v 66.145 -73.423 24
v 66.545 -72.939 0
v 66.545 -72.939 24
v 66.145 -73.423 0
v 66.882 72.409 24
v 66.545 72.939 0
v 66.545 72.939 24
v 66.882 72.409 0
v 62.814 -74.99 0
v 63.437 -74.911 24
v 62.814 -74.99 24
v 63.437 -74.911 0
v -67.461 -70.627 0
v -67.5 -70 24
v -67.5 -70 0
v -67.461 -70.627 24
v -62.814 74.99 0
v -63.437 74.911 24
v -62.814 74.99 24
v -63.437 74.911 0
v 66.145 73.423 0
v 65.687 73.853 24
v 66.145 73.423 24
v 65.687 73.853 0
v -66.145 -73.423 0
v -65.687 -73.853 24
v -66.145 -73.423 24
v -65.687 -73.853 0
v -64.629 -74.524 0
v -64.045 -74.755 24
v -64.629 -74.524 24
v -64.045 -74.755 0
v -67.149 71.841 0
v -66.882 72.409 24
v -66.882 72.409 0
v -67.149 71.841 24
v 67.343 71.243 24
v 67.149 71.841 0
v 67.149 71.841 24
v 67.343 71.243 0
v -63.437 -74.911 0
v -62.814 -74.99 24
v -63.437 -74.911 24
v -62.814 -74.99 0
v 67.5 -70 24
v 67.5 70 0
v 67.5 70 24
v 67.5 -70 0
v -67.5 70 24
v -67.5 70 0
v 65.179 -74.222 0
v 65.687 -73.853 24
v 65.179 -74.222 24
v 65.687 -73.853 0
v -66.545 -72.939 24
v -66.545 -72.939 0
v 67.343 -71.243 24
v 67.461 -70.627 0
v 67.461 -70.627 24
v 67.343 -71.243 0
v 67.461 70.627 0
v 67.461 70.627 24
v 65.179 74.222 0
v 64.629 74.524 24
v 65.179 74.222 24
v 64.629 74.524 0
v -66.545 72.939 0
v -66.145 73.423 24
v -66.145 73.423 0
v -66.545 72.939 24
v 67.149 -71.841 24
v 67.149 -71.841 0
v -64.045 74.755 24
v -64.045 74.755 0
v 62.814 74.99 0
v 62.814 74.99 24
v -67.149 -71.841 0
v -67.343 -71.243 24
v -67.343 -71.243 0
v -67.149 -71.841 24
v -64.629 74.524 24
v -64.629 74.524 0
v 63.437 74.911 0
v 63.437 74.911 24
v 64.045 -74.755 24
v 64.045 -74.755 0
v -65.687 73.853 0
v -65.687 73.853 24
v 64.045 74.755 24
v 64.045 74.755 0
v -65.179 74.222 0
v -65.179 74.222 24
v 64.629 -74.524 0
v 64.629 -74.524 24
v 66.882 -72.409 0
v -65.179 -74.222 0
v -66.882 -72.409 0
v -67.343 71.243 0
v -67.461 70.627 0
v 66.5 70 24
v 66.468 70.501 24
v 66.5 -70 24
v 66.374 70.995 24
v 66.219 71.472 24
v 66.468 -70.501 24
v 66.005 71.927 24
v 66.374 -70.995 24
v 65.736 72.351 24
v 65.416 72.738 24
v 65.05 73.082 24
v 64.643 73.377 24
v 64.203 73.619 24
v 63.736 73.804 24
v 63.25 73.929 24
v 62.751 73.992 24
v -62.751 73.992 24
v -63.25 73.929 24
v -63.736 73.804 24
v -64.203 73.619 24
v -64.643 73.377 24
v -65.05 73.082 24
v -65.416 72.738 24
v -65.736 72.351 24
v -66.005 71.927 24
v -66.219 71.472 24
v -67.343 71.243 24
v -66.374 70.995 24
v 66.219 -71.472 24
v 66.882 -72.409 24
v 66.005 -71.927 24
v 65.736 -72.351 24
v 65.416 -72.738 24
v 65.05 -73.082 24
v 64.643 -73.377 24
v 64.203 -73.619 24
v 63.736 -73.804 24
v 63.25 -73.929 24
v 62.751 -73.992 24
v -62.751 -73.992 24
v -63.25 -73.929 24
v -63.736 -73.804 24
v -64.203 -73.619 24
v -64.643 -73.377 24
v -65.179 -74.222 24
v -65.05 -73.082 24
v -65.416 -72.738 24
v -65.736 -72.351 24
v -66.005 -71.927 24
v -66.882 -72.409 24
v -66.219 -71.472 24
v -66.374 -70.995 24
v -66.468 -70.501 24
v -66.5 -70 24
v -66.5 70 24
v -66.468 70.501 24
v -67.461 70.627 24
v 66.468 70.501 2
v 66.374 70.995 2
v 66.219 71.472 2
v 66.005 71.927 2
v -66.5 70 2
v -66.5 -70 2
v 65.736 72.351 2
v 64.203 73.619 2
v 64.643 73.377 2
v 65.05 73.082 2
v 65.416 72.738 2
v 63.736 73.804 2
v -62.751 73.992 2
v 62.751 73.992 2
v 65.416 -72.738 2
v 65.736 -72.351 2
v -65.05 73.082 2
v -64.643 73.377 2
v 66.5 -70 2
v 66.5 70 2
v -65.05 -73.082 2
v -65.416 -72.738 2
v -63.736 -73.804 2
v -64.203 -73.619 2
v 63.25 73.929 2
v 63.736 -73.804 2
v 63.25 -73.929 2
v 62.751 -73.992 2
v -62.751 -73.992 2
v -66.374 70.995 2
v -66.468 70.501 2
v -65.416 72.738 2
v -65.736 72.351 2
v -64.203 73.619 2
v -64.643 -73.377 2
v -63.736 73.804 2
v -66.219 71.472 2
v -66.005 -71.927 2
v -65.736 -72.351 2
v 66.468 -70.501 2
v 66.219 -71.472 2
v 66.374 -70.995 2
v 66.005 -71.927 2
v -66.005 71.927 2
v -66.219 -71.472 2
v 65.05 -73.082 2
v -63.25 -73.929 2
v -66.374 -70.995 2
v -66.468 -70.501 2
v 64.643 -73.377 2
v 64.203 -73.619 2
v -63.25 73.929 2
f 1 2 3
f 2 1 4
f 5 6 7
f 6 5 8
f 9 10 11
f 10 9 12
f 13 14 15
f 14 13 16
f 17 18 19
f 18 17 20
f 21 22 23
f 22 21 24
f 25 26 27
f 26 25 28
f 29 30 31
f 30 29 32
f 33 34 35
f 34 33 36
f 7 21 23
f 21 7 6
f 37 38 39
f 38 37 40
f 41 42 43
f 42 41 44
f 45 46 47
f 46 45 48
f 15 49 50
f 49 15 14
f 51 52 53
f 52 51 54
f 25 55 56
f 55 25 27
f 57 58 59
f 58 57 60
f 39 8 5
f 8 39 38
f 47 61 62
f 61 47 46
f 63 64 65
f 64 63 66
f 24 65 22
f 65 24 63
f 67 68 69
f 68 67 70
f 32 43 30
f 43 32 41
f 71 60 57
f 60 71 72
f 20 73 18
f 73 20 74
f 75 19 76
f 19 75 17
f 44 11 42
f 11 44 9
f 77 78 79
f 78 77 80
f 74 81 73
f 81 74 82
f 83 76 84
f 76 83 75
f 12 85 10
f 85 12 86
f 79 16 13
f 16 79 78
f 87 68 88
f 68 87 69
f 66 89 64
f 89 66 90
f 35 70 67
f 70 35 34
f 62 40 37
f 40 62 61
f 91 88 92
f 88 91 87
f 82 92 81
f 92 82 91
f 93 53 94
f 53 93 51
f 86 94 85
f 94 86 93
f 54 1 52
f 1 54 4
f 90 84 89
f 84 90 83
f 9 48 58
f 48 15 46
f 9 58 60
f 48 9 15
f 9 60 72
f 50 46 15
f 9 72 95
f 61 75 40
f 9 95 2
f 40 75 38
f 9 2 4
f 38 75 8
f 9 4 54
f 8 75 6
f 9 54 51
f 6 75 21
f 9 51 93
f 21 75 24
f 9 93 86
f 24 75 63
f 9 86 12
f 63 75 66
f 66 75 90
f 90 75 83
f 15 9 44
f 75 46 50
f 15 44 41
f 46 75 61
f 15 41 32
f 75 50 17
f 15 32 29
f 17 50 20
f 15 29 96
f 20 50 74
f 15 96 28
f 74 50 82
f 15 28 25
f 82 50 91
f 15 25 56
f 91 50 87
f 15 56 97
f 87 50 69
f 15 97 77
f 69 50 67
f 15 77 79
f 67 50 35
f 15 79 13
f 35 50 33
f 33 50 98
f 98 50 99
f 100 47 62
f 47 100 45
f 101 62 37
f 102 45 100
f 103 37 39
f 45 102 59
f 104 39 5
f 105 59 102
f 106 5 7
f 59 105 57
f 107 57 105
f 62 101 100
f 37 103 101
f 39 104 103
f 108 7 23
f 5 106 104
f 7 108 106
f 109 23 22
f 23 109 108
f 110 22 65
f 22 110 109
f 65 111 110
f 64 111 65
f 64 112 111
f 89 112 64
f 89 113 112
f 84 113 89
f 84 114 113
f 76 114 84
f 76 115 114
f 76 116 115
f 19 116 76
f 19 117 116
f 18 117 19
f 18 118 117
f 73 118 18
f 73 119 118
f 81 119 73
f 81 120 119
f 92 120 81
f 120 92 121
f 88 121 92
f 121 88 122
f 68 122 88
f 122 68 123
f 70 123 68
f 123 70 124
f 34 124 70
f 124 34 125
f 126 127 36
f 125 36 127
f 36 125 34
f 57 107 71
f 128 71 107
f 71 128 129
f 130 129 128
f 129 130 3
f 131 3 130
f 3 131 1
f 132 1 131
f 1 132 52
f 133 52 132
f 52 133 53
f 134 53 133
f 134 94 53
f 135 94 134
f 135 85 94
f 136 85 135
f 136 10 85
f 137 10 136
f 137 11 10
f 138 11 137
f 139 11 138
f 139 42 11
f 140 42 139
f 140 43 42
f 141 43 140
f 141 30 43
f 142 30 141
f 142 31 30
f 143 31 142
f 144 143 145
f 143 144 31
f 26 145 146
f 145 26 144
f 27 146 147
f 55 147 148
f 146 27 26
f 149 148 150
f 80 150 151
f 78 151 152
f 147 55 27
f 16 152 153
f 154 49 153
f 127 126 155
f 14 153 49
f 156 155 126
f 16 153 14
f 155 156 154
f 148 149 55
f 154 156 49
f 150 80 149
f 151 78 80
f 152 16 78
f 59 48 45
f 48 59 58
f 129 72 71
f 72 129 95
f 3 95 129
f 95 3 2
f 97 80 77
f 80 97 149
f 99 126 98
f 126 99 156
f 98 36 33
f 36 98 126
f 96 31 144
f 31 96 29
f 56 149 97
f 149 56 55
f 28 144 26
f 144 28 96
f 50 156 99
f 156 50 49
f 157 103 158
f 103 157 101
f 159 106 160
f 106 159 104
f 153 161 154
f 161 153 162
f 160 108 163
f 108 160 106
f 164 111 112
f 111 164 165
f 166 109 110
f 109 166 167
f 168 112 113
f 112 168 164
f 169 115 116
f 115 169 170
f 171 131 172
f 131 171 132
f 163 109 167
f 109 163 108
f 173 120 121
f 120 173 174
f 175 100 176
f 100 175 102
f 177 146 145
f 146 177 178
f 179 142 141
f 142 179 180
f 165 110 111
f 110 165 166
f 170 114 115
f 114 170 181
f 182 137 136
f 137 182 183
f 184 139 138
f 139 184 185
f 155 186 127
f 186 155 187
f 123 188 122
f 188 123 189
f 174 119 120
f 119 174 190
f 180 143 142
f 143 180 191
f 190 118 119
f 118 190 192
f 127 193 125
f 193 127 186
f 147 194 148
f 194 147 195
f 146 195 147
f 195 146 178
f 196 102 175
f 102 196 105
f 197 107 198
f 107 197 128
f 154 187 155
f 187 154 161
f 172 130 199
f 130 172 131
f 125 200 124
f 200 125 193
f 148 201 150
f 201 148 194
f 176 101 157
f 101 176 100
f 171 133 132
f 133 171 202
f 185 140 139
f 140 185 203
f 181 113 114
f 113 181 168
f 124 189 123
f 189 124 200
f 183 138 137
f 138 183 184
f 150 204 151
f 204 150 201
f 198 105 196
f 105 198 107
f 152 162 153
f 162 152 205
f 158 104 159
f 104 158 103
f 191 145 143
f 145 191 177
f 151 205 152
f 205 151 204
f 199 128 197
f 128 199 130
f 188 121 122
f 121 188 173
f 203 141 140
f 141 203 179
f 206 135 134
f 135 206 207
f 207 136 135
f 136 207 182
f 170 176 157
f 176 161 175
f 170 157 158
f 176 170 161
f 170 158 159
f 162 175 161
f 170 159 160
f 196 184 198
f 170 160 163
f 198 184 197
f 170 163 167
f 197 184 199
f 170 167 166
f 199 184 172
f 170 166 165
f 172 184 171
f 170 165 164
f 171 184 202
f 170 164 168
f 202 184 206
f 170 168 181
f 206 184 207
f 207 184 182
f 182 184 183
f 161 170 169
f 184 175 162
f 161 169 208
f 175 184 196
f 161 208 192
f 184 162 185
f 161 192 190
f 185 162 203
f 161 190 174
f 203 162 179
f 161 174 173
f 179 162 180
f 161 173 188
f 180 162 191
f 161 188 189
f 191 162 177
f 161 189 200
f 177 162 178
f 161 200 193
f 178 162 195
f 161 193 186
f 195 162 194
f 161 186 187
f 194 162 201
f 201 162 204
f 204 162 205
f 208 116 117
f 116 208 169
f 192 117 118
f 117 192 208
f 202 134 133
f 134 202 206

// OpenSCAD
$fn = 50;


difference() {
	union() {
		hull() {
			translate(v = [-62.5000000000, 70.0000000000, 0]) {
				cylinder(h = 24, r = 5);
			}
			translate(v = [62.5000000000, 70.0000000000, 0]) {
				cylinder(h = 24, r = 5);
			}
			translate(v = [-62.5000000000, -70.0000000000, 0]) {
				cylinder(h = 24, r = 5);
			}
			translate(v = [62.5000000000, -70.0000000000, 0]) {
				cylinder(h = 24, r = 5);
			}
		}
	}
	union() {
		translate(v = [0, 0, 2]) {
			hull() {
				translate(v = [-62.5000000000, 70.0000000000, 0]) {
					cylinder(h = 22, r = 4);
				}
				translate(v = [62.5000000000, 70.0000000000, 0]) {
					cylinder(h = 22, r = 4);
				}
				translate(v = [-62.5000000000, -70.0000000000, 0]) {
					cylinder(h = 22, r = 4);
				}
				translate(v = [62.5000000000, -70.0000000000, 0]) {
					cylinder(h = 22, r = 4);
				}
			}
		}
	}
}
